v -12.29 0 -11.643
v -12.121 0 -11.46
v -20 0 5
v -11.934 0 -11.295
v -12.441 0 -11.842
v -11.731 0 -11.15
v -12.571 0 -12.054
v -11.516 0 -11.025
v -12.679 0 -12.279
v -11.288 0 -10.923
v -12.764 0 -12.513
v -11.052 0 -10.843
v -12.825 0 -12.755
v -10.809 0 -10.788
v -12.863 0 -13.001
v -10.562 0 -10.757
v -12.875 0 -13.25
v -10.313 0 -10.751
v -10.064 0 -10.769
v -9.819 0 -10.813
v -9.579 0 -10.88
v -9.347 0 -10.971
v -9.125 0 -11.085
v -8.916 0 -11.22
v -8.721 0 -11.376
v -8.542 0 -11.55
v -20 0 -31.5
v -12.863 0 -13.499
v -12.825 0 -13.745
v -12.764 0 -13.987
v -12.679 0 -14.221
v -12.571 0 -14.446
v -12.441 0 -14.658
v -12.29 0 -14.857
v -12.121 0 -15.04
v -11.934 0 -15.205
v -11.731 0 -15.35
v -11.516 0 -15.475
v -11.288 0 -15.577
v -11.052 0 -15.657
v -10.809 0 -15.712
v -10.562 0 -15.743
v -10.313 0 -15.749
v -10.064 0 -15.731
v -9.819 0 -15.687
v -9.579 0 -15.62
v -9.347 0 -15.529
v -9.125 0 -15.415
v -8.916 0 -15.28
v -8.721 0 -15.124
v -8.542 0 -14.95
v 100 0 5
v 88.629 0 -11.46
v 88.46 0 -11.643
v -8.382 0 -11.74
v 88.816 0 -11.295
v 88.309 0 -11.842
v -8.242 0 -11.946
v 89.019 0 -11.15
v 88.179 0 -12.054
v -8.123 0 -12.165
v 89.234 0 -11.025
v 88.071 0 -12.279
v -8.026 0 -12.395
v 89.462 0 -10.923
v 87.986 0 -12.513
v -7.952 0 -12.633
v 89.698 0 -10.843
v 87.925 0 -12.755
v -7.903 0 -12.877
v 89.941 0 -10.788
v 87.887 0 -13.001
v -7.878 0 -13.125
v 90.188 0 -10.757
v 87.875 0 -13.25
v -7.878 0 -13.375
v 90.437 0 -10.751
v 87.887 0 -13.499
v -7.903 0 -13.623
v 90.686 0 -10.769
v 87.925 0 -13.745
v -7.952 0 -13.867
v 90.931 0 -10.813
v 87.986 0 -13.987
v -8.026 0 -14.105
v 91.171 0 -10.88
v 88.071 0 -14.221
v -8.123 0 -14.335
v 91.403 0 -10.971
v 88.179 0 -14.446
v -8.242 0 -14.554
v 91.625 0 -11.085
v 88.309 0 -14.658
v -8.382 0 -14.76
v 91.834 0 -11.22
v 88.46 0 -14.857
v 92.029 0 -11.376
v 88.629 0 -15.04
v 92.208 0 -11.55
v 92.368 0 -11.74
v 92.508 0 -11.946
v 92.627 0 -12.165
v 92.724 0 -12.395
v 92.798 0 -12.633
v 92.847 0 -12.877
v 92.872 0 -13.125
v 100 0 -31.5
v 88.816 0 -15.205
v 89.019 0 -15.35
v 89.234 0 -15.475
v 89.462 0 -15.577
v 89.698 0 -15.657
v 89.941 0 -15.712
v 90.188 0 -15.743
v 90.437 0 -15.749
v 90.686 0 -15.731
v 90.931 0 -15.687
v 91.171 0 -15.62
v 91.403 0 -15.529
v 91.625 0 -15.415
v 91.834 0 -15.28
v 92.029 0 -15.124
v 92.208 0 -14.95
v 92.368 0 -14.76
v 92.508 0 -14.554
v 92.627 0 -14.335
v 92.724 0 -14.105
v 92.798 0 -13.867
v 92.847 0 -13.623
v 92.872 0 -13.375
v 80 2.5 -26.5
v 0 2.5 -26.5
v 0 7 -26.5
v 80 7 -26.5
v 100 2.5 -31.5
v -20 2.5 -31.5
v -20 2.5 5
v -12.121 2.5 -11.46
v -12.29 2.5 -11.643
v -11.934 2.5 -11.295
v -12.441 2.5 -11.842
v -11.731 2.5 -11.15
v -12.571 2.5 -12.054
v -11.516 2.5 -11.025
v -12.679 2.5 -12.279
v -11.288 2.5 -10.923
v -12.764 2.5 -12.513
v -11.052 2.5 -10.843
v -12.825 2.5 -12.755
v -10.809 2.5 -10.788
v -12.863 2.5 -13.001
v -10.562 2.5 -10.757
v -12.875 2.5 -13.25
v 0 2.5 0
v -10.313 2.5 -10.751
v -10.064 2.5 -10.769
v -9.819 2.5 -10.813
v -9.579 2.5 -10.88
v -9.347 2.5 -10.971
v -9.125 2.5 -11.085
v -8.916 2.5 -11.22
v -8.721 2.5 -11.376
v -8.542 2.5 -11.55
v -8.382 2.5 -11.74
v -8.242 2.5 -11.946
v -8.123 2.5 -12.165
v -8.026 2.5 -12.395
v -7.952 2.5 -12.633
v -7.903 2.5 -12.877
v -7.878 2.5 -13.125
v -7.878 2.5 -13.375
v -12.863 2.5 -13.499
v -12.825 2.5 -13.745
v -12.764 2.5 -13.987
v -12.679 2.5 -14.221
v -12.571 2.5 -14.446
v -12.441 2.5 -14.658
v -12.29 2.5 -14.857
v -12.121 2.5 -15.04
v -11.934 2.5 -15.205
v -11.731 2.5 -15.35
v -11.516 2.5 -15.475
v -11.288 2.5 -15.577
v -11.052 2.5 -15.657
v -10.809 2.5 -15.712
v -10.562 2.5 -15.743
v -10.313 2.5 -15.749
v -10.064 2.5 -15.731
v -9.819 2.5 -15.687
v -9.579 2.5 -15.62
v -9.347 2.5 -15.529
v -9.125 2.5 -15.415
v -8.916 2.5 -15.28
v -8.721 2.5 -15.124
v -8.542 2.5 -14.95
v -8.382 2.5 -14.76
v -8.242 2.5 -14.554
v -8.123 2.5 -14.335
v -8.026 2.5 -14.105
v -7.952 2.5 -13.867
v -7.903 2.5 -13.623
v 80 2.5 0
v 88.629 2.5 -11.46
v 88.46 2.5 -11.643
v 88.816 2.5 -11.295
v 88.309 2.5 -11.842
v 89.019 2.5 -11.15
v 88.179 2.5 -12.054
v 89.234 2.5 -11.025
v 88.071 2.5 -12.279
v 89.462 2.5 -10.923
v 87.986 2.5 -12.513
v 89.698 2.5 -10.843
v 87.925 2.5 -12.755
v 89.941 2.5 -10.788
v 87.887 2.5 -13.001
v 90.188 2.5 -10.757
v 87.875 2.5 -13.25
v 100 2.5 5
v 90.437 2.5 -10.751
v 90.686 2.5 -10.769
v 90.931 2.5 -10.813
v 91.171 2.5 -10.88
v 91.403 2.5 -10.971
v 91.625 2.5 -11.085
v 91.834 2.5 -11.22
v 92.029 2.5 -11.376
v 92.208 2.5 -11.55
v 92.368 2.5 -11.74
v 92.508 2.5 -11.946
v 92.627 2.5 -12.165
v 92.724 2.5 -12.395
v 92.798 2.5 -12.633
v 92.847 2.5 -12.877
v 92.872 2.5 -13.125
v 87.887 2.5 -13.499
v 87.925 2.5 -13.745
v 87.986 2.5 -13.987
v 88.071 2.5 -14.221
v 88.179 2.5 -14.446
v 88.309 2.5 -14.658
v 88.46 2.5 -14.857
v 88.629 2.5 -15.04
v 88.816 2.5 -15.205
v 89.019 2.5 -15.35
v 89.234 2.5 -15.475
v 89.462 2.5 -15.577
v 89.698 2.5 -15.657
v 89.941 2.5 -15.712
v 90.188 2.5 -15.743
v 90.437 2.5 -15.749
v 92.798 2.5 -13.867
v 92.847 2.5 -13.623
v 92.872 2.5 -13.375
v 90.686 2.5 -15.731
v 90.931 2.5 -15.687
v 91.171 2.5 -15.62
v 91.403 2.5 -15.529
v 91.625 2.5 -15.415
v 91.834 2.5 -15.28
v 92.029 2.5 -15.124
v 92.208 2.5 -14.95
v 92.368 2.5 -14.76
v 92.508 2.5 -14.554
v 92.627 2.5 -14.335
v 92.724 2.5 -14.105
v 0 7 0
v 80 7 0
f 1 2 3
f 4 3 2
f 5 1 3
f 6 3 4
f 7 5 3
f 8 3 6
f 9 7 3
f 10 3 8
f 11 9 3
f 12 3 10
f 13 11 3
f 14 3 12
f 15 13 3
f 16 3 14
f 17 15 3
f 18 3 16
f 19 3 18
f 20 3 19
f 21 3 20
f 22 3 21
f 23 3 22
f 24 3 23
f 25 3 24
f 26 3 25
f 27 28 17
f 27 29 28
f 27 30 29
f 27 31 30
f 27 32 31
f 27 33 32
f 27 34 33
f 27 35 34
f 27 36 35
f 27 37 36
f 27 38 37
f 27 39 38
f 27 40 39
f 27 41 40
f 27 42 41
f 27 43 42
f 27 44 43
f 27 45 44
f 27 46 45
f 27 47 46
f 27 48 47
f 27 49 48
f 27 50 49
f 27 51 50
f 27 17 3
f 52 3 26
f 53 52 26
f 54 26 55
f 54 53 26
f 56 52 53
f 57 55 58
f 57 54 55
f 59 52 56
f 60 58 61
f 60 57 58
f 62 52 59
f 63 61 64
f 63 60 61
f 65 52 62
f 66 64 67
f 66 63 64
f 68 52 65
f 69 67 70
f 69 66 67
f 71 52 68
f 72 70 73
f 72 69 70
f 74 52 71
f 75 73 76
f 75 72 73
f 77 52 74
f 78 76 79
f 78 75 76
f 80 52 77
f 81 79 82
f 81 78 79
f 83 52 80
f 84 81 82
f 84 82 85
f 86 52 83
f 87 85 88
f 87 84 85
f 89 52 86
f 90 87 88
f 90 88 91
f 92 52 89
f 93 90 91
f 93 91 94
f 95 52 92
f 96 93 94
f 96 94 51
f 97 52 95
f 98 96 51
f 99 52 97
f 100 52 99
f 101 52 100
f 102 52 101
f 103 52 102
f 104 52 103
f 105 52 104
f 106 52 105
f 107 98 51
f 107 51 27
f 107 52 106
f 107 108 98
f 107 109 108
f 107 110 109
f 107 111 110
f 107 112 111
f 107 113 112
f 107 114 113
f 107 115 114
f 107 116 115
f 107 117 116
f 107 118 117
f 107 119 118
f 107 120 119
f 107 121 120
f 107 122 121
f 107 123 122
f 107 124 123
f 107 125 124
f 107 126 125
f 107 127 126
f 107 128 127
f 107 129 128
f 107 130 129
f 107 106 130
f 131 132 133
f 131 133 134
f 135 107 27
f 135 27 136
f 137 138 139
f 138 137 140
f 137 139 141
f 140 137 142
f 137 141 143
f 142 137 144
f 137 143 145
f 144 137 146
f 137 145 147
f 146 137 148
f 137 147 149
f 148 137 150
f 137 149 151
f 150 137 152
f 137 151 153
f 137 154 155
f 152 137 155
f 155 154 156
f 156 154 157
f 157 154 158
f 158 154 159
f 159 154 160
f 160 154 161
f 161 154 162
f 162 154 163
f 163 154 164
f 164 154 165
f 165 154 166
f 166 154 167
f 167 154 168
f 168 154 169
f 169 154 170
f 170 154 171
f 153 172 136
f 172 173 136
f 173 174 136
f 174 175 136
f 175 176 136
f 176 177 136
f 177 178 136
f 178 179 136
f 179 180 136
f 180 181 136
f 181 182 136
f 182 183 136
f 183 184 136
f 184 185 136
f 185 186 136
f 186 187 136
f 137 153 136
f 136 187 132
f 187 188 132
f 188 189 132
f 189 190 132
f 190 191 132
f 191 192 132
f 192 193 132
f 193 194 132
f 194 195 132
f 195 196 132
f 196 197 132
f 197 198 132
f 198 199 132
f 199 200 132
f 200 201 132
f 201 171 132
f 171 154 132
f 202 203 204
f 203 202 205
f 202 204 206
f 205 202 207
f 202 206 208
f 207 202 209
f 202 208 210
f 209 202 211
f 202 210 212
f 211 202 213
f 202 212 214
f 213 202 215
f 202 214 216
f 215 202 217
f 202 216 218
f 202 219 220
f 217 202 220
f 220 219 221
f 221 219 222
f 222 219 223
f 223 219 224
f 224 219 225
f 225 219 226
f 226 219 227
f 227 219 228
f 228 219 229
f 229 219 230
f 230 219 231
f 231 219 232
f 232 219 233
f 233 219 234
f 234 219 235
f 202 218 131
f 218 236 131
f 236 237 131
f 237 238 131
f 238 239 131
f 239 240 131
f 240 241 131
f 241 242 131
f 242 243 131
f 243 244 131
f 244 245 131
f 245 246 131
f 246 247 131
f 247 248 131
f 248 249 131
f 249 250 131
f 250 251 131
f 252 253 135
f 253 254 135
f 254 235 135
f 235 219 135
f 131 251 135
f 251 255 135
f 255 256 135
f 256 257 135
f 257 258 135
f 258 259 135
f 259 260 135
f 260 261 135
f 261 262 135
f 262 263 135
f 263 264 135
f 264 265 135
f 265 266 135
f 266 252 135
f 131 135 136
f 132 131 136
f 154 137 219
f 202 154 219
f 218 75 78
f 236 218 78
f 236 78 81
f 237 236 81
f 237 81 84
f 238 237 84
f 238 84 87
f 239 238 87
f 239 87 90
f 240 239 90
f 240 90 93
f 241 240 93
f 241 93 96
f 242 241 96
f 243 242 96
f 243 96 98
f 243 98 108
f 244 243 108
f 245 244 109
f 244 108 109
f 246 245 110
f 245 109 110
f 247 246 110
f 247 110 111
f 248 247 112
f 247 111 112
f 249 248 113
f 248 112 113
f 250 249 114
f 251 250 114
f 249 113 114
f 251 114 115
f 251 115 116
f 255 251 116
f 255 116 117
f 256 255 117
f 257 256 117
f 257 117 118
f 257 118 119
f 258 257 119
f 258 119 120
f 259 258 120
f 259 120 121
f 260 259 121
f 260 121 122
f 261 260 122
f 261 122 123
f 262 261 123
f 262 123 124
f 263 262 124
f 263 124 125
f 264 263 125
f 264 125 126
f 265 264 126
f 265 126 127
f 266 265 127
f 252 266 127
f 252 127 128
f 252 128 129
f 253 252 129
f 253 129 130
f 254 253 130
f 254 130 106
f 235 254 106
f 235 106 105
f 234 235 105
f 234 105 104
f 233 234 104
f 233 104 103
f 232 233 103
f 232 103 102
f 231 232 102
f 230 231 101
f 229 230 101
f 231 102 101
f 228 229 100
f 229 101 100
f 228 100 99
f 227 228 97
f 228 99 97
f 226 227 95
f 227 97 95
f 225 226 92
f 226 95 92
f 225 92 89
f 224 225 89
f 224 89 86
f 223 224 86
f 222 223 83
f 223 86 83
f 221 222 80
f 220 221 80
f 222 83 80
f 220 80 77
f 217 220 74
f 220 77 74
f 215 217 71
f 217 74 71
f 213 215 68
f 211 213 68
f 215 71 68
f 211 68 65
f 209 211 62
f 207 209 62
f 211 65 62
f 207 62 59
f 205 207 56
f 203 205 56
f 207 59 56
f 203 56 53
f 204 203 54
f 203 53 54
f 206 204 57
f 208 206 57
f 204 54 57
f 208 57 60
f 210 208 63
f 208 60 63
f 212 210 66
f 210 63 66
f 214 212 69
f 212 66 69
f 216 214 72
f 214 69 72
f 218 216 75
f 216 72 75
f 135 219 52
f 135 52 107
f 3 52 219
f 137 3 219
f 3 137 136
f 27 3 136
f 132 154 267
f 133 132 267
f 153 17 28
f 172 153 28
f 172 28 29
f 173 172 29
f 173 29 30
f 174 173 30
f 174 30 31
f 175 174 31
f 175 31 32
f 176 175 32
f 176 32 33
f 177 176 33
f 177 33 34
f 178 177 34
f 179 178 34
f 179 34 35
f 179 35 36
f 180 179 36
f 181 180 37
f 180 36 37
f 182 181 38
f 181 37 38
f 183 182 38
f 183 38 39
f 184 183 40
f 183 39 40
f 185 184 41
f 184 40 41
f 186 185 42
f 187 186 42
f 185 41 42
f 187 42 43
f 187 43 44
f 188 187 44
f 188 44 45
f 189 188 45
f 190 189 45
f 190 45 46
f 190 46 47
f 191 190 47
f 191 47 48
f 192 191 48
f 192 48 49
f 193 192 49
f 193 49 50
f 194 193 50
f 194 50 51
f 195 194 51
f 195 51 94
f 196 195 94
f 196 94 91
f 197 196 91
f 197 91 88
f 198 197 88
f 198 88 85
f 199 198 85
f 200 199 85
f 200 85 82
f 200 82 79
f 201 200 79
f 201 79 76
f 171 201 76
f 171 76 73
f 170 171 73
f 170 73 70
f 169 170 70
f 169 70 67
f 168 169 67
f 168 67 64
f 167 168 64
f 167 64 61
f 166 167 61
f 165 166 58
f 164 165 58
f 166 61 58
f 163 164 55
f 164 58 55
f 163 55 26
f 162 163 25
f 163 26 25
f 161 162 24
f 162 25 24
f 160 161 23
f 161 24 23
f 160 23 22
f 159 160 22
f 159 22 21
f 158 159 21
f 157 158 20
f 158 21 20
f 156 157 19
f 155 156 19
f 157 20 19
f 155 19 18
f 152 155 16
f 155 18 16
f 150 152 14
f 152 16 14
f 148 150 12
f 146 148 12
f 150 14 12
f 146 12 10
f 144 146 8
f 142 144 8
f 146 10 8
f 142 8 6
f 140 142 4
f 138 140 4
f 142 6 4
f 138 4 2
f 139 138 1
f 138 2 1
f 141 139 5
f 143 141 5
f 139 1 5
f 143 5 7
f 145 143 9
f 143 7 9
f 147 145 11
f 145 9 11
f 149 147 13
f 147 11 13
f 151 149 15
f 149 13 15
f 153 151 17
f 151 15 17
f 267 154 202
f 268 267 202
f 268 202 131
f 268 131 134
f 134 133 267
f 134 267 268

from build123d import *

# Parameters (mm, degrees)
SKETCH1_W                = 80
SKETCH1_H                = 26.5
BOSS_EXTRUDE1_DEPTH      = 7
SKETCH5_W                = 80
SKETCH5_H                = 2.5
BOSS_EXTRUDE5_DEPTH      = 5
BOSS_EXTRUDE5_DEPTH_BACK = 31.5
SKETCH6_W                = 36.5
SKETCH6_H                = 2.5
BOSS_EXTRUDE6_DEPTH      = 20
BOSS_EXTRUDE6_DEPTH_BACK = 100
F_5_0MM_DOWEL_HOLE1_D    = 5


with BuildPart() as part:
    # Sketch1 → Boss-Extrude1 (new body)
    with BuildSketch(Plane(origin=(0, 0, 0), x_dir=(1, 0, 0), z_dir=(0, 1, 0))):
        with Locations((40, 13.25)):
            Rectangle(SKETCH1_W, SKETCH1_H)
    extrude(amount=BOSS_EXTRUDE1_DEPTH)

    # Sketch5 → Boss-Extrude5 (add, two sides)
    with BuildSketch(Plane.XY) as boss_extrude5_sk:
        with Locations((40, 1.25)):
            Rectangle(SKETCH5_W, SKETCH5_H)
    extrude(amount=BOSS_EXTRUDE5_DEPTH)
    extrude(boss_extrude5_sk.sketch, amount=-BOSS_EXTRUDE5_DEPTH_BACK)

    # Sketch6 → Boss-Extrude6 (add, two sides)
    with BuildSketch(Plane(origin=(80, 0, 0), x_dir=(0, 0, -1), z_dir=(1, 0, 0))) as boss_extrude6_sk:
        with Locations((13.25, 1.25)):
            Rectangle(SKETCH6_W, SKETCH6_H)
    extrude(amount=BOSS_EXTRUDE6_DEPTH)
    extrude(boss_extrude6_sk.sketch, amount=-BOSS_EXTRUDE6_DEPTH_BACK)

    # Ø5.0mm Dowel Hole1 (through all)
    with Locations(Plane(origin=(0, 2.5, 0), x_dir=(1, 0, 0), z_dir=(0, 1, 0))):
        with Locations((-10.375, 13.25), (90.375, 13.25)):
            Hole(F_5_0MM_DOWEL_HOLE1_D / 2)


solid = part.part
